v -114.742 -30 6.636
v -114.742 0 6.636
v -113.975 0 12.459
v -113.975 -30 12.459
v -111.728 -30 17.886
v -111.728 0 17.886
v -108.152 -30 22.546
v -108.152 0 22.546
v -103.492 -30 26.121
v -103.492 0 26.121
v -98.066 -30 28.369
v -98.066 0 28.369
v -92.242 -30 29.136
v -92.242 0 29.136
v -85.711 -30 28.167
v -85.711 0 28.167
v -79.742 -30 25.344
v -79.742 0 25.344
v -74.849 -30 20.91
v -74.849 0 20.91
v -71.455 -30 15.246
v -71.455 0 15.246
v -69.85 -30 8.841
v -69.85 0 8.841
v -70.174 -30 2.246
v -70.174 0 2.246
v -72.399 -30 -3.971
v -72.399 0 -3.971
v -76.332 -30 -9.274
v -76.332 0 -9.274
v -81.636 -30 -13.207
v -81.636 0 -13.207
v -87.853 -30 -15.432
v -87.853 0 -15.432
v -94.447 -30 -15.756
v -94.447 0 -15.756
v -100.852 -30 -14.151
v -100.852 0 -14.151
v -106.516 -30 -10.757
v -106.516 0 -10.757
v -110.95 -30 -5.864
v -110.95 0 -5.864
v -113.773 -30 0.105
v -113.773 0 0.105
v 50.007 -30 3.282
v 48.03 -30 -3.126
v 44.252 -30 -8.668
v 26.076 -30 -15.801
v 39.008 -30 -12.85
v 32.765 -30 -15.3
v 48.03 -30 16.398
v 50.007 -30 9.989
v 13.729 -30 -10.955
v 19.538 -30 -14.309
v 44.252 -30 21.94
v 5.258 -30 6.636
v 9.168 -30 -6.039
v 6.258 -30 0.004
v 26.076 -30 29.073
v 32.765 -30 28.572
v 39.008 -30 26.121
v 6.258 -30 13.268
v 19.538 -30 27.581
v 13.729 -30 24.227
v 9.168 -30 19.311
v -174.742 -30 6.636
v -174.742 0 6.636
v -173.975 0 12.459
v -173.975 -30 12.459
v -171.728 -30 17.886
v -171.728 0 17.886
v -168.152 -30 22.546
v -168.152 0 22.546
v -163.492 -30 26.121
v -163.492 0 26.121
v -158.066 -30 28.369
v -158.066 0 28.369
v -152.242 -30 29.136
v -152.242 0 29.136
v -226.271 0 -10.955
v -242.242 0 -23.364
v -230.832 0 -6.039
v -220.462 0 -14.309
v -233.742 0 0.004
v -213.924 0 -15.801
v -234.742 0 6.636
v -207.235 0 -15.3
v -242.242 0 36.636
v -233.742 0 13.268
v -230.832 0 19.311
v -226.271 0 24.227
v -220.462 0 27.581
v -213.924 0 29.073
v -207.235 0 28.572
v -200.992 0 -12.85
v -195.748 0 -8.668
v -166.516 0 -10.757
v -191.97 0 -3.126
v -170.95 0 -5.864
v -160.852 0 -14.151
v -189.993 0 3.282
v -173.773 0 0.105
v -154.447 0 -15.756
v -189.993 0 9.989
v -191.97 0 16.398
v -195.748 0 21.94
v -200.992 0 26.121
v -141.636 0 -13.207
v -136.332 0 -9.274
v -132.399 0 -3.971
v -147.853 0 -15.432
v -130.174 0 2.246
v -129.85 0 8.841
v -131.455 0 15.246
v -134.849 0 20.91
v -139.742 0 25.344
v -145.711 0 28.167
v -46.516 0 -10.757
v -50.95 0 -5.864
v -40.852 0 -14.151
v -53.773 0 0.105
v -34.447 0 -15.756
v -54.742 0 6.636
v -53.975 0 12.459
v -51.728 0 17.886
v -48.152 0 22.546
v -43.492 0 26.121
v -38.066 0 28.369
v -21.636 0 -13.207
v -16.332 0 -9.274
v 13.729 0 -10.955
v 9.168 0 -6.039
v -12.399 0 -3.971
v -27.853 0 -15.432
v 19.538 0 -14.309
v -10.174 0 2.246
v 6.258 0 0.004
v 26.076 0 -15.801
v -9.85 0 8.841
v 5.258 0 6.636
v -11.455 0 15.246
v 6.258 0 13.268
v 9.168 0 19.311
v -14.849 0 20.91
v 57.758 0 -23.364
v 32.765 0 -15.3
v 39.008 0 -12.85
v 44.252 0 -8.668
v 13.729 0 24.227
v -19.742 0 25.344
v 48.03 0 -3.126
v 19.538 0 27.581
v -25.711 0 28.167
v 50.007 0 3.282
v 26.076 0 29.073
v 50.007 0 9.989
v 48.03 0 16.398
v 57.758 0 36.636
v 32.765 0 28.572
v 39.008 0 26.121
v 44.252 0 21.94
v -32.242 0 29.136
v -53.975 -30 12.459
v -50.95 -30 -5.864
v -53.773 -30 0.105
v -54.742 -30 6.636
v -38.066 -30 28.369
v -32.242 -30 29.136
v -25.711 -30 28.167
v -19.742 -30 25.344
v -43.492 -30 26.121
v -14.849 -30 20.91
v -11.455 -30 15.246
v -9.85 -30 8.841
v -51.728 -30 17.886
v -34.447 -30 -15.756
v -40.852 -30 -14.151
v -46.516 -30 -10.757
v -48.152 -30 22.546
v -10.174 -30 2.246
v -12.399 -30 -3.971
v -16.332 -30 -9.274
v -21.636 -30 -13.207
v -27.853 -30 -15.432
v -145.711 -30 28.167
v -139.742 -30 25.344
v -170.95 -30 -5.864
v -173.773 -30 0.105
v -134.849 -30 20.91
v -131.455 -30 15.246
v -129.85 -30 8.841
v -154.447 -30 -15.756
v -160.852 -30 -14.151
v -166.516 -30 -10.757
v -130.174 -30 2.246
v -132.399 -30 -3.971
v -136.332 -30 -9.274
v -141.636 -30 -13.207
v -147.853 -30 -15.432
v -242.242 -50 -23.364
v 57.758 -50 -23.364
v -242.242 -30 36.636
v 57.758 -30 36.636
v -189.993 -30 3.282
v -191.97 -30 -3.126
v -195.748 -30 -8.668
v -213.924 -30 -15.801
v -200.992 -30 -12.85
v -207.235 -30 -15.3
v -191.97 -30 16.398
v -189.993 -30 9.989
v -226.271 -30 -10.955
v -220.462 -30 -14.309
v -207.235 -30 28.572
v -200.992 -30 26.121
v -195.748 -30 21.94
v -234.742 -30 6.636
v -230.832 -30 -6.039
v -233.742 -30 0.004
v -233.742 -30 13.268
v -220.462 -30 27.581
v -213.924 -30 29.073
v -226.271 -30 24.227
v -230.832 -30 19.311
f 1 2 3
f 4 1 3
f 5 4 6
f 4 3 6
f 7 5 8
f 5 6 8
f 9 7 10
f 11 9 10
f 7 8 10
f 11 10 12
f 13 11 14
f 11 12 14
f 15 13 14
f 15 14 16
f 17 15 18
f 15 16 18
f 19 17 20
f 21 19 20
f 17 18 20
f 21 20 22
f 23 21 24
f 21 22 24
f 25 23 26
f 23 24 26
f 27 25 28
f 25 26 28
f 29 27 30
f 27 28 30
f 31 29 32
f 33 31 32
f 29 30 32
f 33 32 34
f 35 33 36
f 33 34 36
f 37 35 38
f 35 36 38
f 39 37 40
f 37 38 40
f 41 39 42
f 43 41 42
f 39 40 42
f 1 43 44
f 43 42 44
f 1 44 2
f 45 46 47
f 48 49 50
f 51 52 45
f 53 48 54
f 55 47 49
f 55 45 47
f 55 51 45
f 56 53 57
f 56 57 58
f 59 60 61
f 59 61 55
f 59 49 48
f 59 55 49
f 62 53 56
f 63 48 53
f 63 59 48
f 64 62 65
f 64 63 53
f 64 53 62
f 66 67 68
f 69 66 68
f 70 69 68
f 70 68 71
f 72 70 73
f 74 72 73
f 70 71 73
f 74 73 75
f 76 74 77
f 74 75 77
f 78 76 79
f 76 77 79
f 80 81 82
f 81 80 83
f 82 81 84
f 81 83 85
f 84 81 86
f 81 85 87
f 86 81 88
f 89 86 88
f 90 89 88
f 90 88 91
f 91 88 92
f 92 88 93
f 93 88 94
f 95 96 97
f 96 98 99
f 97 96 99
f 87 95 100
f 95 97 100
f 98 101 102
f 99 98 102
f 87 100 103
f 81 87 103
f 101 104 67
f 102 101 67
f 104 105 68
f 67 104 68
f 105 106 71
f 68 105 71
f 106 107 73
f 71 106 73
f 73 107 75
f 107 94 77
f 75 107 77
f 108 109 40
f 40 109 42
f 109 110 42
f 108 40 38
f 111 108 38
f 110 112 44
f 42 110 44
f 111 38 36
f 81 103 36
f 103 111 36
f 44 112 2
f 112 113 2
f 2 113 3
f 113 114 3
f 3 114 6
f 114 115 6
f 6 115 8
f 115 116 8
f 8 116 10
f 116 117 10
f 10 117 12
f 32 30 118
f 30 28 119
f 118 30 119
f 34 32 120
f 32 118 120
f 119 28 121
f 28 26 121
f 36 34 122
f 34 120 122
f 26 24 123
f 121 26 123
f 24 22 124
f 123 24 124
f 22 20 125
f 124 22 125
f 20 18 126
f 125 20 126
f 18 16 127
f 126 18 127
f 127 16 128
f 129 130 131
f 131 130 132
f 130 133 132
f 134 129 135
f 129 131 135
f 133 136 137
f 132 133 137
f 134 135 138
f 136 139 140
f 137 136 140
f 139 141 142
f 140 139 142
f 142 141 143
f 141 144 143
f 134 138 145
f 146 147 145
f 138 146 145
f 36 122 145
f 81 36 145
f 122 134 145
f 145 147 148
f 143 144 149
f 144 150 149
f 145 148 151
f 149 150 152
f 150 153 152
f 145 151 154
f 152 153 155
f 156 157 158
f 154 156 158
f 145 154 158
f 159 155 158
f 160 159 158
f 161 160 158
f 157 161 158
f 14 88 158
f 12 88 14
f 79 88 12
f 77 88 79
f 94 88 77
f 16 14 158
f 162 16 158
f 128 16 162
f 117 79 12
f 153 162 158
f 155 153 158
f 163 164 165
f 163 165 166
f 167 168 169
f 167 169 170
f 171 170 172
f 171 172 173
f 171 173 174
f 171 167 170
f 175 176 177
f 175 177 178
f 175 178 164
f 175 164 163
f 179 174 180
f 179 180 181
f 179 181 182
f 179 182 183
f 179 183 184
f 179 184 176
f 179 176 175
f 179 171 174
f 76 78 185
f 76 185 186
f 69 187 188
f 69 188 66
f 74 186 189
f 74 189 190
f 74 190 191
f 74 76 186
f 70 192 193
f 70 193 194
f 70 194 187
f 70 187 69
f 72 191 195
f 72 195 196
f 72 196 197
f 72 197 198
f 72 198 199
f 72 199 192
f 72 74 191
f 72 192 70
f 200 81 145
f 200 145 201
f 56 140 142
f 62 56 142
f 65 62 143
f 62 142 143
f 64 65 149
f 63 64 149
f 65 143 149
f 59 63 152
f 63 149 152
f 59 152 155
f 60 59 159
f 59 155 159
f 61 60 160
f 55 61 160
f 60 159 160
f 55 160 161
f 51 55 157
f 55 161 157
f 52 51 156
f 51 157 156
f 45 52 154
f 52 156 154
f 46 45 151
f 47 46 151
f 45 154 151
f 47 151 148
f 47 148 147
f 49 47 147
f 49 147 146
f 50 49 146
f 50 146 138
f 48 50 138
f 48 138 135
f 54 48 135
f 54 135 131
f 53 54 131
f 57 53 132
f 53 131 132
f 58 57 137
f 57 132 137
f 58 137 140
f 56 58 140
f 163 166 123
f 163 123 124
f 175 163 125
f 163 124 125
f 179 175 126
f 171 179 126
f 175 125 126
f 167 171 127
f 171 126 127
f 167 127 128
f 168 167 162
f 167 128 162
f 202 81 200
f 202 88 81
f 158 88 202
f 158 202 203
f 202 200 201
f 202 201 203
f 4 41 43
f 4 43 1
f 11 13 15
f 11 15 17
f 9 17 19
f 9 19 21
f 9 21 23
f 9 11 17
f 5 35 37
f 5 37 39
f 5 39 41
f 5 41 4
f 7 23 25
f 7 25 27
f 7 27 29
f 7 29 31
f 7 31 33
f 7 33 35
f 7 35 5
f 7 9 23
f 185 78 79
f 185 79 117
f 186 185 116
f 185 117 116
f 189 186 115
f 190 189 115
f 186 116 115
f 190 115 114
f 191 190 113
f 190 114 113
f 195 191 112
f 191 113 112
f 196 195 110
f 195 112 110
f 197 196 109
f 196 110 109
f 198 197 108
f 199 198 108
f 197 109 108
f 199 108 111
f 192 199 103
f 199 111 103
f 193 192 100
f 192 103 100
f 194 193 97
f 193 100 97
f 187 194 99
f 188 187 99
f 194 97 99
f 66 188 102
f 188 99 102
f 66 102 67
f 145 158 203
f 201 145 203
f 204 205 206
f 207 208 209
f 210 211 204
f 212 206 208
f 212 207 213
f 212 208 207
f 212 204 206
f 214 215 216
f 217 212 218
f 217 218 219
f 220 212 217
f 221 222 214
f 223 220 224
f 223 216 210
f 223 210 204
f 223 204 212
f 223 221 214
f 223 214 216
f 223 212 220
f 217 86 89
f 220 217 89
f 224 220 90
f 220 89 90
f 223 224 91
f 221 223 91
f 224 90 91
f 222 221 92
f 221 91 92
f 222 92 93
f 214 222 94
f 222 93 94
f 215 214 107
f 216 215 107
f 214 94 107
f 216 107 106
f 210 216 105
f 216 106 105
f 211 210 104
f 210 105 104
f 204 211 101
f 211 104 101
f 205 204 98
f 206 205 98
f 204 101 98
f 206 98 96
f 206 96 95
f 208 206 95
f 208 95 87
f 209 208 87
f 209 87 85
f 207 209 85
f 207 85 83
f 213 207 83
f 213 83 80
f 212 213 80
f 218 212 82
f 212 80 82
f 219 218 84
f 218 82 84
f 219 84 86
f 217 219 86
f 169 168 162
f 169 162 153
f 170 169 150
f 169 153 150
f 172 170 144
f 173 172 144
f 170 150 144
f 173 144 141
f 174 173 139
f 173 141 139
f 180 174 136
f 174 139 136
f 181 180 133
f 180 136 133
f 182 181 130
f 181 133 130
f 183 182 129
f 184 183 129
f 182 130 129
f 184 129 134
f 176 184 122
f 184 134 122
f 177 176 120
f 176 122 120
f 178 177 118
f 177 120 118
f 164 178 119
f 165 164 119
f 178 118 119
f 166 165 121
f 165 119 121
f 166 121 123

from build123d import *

# Parameters (mm, degrees)
F0_W     = 300
F0_H     = 60
F1_DEPTH = 30
F3_DEPTH = 300
F4_R     = 22.5
F5_DEPTH = 30


with BuildPart() as f1:
    # F0 (on Front) → F1 (new body)
    with BuildSketch(Plane.XZ):
        with Locations((-92.24209, 6.635918)):
            Rectangle(F0_W, F0_H)
    extrude(amount=F1_DEPTH)

    # F2 (on face) → F3 (join)
    with BuildSketch(Plane(origin=(-242.24209, 0, 0), x_dir=(0, -1, 0), z_dir=(-1, 0, 0))):
        Polygon((30, 36.635918), (30, -23.364082), (50, -23.364082), align=None)
    extrude(amount=-F3_DEPTH)

    # F4 (on face) → F5 (cut)
    with BuildSketch(Plane(origin=(0, 0, 0), x_dir=(-1, 0, 0), z_dir=(0, 1, 0))):
        with Locations((-27.75791, 6.635918)):
            Circle(F4_R)
        with BuildLine():
            ThreePointArc((54.74209, 6.635918), (48.151992, 22.545821), (32.24209, 29.135918))
            ThreePointArc((32.24209, 29.135918), (16.332187, -9.273985), (54.74209, 6.635918))
        make_face()
        with BuildLine():
            ThreePointArc((114.74209, 6.635918), (108.151992, 22.545821), (92.24209, 29.135918))
            ThreePointArc((92.24209, 29.135918), (76.332187, -9.273985), (114.74209, 6.635918))
        make_face()
        with BuildLine():
            ThreePointArc((174.74209, 6.635918), (168.151992, 22.545821), (152.24209, 29.135918))
            ThreePointArc((152.24209, 29.135918), (136.332187, -9.273985), (174.74209, 6.635918))
        make_face()
        with Locations((212.24209, 6.635918)):
            Circle(F4_R)
    extrude(amount=-F5_DEPTH, mode=Mode.SUBTRACT)


solid = f1.part
